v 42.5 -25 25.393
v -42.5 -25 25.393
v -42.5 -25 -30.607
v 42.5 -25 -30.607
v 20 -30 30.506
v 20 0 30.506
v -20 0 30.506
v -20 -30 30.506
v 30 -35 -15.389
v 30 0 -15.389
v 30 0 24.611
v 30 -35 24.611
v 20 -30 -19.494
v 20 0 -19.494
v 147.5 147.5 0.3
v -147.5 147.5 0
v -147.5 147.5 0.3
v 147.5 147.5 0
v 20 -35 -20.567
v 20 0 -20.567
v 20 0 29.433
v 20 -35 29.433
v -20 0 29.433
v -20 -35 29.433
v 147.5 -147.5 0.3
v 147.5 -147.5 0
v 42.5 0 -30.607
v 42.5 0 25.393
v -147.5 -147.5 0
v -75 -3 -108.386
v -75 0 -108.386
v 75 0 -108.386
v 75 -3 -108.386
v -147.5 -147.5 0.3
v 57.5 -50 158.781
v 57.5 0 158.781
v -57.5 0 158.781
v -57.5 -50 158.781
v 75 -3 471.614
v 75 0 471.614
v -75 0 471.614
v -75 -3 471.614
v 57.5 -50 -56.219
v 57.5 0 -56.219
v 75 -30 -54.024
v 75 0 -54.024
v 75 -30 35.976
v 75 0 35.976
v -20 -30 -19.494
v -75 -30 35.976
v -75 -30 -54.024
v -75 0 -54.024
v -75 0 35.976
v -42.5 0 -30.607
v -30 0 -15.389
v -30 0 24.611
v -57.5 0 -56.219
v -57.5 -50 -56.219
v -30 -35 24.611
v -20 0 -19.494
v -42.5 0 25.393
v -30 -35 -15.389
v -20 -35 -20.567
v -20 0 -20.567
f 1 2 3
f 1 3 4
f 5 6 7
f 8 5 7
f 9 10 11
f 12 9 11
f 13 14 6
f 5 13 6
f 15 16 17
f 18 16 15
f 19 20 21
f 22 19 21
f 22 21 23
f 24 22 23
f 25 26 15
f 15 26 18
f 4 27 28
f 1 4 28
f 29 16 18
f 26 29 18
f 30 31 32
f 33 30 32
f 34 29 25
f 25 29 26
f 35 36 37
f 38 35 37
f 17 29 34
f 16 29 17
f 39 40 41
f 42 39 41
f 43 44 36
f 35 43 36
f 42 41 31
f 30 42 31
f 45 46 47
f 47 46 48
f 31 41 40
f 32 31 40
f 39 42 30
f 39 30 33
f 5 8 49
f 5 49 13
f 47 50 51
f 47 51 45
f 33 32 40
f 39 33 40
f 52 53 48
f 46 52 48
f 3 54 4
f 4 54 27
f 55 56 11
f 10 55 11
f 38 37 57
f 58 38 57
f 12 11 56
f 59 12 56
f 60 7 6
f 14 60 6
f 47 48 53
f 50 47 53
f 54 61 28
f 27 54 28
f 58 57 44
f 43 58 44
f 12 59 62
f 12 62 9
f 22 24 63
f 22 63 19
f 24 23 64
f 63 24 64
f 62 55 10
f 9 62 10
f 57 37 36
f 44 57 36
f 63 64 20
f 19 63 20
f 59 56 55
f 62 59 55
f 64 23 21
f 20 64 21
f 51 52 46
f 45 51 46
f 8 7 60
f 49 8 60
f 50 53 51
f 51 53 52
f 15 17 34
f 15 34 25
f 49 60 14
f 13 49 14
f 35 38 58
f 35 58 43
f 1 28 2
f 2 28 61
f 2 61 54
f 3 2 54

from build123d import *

# Parameters (mm, degrees)
F1_DEPTH  = 50
F3_DEPTH  = 25
F5_DEPTH  = 35
F7_DEPTH  = 30
F9_DEPTH  = 3
F11_DEPTH = 30
F13_DEPTH = 35
F14_W     = 295
F14_H     = 295
F15_DEPTH = 0.3


with BuildPart() as f1:
    # F0 (on Front) → F1 (new body)
    with BuildSketch(Plane.XZ):
        Polygon((57.5, 158.780627), (0, 158.780627), (-57.5, 158.780627), (-57.5, -56.219373), (0, -56.219373), (57.5, -56.219373), align=None)
    extrude(amount=F1_DEPTH)


with BuildPart() as f3:
    # F2 (on Front) → F3 (new body)
    with BuildSketch(Plane.XZ):
        Polygon((42.5, 25.393007), (0, 25.393007), (-42.5, 25.393007), (-42.5, -30.606993), (0, -30.606993), (42.5, -30.606993), align=None)
    extrude(amount=F3_DEPTH)


with BuildPart() as f5:
    # F4 (on Front) → F5 (new body)
    with BuildSketch(Plane.XZ):
        Polygon((30, 24.611398), (0, 24.611398), (-30, 24.611398), (-30, -15.388602), (0, -15.388602), (30, -15.388602), align=None)
    extrude(amount=F5_DEPTH)


with BuildPart() as f7:
    # F6 (on Front) → F7 (new body)
    with BuildSketch(Plane.XZ):
        Polygon((75, 35.97626), (0, 35.97626), (-75, 35.97626), (-75, -54.02374), (0, -54.02374), (75, -54.02374), align=None)
    extrude(amount=F7_DEPTH)


with BuildPart() as f9:
    # F8 (on Front) → F9 (new body)
    with BuildSketch(Plane.XZ):
        Polygon((75, 471.614421), (0, 471.614421), (-75, 471.614421), (-75, -108.385579), (0, -108.385579), (75, -108.385579), align=None)
    extrude(amount=F9_DEPTH)


with BuildPart() as f11:
    # F10 (on Front) → F11 (new body)
    with BuildSketch(Plane.XZ):
        Polygon((20, 30.50577), (0, 30.50577), (-20, 30.50577), (-20, -19.49423), (0, -19.49423), (20, -19.49423), align=None)
    extrude(amount=F11_DEPTH)


with BuildPart() as f13:
    # F12 (on Front) → F13 (new body)
    with BuildSketch(Plane.XZ):
        Polygon((20, 29.432625), (0, 29.432625), (-20, 29.432625), (-20, -20.567375), (0, -20.567375), (20, -20.567375), align=None)
    extrude(amount=F13_DEPTH)


with BuildPart() as f15:
    # F14 (on Top) → F15 (new body)
    with BuildSketch(Plane.XY):
        Rectangle(F14_W, F14_H)
    extrude(amount=F15_DEPTH)


solid = Compound([f1.part, f3.part, f5.part, f7.part, f9.part, f11.part, f13.part, f15.part])
